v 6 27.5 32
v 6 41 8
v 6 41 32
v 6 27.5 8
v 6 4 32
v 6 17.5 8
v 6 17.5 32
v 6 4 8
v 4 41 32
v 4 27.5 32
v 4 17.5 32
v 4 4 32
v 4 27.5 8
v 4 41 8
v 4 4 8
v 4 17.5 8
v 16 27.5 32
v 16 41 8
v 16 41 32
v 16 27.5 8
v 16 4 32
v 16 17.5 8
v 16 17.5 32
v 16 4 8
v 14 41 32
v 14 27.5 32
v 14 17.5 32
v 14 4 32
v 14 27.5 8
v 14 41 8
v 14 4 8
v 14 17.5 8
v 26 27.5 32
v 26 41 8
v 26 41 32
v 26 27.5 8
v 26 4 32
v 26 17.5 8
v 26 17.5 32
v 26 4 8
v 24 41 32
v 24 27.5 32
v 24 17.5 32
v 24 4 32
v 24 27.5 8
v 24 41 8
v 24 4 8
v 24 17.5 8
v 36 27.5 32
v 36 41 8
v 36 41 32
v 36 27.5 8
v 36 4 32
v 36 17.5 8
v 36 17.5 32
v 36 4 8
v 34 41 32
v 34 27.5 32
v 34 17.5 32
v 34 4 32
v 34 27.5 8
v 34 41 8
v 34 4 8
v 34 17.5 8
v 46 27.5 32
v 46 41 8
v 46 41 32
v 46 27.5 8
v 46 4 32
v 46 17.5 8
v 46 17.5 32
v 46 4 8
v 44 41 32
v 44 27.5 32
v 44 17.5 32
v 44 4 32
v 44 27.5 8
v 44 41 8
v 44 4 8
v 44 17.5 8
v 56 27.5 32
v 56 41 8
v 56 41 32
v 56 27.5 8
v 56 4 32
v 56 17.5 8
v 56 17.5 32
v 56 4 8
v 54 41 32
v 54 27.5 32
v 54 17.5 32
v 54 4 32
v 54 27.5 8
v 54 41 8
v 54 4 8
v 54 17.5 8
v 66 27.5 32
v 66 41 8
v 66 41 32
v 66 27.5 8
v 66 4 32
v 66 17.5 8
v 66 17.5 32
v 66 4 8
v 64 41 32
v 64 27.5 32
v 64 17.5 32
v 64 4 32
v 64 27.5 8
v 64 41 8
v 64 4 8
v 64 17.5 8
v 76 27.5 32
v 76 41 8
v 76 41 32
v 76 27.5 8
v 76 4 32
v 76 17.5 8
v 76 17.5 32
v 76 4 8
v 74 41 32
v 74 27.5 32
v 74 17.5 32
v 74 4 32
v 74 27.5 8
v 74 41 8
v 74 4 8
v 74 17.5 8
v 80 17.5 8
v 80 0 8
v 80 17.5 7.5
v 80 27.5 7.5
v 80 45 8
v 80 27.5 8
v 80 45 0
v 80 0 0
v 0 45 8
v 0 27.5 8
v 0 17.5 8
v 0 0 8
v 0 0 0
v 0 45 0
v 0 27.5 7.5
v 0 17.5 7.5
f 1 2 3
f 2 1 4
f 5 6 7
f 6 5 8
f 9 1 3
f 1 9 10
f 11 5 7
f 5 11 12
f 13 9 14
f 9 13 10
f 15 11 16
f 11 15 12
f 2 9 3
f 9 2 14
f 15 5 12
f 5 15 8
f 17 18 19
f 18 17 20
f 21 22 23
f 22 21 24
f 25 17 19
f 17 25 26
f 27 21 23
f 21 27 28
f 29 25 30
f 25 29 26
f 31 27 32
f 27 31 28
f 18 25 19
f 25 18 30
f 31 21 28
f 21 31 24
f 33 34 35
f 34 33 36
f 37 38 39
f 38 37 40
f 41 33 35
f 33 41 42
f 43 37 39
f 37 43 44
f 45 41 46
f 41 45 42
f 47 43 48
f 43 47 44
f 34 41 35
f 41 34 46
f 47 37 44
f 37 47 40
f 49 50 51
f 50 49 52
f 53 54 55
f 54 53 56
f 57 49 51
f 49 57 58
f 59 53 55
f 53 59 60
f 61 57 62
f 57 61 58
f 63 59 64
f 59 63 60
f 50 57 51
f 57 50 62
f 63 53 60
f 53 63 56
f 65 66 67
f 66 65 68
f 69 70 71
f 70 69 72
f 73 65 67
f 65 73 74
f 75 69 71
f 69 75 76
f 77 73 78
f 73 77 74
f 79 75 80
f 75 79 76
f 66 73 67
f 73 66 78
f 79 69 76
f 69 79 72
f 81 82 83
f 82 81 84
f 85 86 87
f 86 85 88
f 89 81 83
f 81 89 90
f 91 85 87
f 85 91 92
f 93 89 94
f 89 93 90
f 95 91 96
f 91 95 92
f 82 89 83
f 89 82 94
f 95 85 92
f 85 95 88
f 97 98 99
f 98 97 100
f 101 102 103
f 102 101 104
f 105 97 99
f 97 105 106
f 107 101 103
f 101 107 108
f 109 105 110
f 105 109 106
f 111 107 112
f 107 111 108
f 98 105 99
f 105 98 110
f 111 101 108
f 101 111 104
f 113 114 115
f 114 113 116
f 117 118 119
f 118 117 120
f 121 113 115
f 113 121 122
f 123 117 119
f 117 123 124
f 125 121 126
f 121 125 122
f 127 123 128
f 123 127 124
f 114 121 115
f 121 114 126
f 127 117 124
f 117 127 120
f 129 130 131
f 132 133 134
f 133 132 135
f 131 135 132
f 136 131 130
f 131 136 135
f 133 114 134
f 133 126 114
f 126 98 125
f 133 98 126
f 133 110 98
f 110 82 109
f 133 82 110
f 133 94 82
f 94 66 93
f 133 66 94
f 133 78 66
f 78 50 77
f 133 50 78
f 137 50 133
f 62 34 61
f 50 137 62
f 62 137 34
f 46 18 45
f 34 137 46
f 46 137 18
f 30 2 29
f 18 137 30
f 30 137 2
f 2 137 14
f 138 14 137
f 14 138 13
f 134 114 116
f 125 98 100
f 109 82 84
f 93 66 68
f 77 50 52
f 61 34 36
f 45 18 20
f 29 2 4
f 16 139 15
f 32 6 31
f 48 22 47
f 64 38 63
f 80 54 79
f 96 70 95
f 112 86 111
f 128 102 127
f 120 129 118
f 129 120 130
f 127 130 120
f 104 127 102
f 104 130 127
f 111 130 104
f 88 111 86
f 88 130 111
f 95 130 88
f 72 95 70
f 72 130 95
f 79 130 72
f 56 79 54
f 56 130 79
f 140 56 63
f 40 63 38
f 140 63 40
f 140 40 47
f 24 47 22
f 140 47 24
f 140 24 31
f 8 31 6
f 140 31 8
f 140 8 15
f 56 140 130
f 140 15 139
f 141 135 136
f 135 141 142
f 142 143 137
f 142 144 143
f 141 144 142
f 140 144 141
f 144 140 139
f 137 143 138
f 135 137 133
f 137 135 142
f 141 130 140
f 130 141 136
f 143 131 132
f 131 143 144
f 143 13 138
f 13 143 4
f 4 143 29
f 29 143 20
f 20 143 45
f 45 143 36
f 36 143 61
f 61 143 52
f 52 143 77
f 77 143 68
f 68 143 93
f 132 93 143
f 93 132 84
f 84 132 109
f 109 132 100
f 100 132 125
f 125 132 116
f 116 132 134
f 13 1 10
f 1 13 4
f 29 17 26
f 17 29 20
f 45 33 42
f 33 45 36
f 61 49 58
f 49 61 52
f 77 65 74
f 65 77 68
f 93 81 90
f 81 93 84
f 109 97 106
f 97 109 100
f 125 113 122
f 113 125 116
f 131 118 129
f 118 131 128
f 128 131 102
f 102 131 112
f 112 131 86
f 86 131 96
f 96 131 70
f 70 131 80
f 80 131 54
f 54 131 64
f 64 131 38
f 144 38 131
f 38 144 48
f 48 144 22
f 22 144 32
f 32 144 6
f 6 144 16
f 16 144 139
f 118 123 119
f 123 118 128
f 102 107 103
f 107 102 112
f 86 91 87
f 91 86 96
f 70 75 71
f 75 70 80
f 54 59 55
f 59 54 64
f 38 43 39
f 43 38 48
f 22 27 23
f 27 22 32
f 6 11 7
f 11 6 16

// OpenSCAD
$fn = 32;

// ----------------------------------------------------------------------
// Heatsink: slotted fin block
// ----------------------------------------------------------------------

// --- parameters (mm) ---
base_l = 80;              // base length, X
base_w = 45;              // base width, Y
base_t = 8;               // base plate thickness
fin_h = 25;               // fin height above the base
fin_t = 2;                // fin thickness
edge = 4;                 // margin from the base ends
pitch = 10;               // fin pitch
slot_w = 10;              // central slot width, Y

n_fins = floor((base_l - 2 * edge - fin_t) / pitch) + 1;  // fin count
total_h = base_t + fin_h - 1;  // overall height

difference() {
union() {
  cube([base_l, base_w, base_t]);
  for (i = [0 : n_fins - 1])
    translate([edge + i * pitch, edge, base_t - 1])
      cube([fin_t, base_w - 2 * edge, fin_h]);
}
  translate([-1, base_w / 2 - slot_w / 2, base_t - 0.5])
    cube([base_l + 2, slot_w, fin_h + 2]);
}
